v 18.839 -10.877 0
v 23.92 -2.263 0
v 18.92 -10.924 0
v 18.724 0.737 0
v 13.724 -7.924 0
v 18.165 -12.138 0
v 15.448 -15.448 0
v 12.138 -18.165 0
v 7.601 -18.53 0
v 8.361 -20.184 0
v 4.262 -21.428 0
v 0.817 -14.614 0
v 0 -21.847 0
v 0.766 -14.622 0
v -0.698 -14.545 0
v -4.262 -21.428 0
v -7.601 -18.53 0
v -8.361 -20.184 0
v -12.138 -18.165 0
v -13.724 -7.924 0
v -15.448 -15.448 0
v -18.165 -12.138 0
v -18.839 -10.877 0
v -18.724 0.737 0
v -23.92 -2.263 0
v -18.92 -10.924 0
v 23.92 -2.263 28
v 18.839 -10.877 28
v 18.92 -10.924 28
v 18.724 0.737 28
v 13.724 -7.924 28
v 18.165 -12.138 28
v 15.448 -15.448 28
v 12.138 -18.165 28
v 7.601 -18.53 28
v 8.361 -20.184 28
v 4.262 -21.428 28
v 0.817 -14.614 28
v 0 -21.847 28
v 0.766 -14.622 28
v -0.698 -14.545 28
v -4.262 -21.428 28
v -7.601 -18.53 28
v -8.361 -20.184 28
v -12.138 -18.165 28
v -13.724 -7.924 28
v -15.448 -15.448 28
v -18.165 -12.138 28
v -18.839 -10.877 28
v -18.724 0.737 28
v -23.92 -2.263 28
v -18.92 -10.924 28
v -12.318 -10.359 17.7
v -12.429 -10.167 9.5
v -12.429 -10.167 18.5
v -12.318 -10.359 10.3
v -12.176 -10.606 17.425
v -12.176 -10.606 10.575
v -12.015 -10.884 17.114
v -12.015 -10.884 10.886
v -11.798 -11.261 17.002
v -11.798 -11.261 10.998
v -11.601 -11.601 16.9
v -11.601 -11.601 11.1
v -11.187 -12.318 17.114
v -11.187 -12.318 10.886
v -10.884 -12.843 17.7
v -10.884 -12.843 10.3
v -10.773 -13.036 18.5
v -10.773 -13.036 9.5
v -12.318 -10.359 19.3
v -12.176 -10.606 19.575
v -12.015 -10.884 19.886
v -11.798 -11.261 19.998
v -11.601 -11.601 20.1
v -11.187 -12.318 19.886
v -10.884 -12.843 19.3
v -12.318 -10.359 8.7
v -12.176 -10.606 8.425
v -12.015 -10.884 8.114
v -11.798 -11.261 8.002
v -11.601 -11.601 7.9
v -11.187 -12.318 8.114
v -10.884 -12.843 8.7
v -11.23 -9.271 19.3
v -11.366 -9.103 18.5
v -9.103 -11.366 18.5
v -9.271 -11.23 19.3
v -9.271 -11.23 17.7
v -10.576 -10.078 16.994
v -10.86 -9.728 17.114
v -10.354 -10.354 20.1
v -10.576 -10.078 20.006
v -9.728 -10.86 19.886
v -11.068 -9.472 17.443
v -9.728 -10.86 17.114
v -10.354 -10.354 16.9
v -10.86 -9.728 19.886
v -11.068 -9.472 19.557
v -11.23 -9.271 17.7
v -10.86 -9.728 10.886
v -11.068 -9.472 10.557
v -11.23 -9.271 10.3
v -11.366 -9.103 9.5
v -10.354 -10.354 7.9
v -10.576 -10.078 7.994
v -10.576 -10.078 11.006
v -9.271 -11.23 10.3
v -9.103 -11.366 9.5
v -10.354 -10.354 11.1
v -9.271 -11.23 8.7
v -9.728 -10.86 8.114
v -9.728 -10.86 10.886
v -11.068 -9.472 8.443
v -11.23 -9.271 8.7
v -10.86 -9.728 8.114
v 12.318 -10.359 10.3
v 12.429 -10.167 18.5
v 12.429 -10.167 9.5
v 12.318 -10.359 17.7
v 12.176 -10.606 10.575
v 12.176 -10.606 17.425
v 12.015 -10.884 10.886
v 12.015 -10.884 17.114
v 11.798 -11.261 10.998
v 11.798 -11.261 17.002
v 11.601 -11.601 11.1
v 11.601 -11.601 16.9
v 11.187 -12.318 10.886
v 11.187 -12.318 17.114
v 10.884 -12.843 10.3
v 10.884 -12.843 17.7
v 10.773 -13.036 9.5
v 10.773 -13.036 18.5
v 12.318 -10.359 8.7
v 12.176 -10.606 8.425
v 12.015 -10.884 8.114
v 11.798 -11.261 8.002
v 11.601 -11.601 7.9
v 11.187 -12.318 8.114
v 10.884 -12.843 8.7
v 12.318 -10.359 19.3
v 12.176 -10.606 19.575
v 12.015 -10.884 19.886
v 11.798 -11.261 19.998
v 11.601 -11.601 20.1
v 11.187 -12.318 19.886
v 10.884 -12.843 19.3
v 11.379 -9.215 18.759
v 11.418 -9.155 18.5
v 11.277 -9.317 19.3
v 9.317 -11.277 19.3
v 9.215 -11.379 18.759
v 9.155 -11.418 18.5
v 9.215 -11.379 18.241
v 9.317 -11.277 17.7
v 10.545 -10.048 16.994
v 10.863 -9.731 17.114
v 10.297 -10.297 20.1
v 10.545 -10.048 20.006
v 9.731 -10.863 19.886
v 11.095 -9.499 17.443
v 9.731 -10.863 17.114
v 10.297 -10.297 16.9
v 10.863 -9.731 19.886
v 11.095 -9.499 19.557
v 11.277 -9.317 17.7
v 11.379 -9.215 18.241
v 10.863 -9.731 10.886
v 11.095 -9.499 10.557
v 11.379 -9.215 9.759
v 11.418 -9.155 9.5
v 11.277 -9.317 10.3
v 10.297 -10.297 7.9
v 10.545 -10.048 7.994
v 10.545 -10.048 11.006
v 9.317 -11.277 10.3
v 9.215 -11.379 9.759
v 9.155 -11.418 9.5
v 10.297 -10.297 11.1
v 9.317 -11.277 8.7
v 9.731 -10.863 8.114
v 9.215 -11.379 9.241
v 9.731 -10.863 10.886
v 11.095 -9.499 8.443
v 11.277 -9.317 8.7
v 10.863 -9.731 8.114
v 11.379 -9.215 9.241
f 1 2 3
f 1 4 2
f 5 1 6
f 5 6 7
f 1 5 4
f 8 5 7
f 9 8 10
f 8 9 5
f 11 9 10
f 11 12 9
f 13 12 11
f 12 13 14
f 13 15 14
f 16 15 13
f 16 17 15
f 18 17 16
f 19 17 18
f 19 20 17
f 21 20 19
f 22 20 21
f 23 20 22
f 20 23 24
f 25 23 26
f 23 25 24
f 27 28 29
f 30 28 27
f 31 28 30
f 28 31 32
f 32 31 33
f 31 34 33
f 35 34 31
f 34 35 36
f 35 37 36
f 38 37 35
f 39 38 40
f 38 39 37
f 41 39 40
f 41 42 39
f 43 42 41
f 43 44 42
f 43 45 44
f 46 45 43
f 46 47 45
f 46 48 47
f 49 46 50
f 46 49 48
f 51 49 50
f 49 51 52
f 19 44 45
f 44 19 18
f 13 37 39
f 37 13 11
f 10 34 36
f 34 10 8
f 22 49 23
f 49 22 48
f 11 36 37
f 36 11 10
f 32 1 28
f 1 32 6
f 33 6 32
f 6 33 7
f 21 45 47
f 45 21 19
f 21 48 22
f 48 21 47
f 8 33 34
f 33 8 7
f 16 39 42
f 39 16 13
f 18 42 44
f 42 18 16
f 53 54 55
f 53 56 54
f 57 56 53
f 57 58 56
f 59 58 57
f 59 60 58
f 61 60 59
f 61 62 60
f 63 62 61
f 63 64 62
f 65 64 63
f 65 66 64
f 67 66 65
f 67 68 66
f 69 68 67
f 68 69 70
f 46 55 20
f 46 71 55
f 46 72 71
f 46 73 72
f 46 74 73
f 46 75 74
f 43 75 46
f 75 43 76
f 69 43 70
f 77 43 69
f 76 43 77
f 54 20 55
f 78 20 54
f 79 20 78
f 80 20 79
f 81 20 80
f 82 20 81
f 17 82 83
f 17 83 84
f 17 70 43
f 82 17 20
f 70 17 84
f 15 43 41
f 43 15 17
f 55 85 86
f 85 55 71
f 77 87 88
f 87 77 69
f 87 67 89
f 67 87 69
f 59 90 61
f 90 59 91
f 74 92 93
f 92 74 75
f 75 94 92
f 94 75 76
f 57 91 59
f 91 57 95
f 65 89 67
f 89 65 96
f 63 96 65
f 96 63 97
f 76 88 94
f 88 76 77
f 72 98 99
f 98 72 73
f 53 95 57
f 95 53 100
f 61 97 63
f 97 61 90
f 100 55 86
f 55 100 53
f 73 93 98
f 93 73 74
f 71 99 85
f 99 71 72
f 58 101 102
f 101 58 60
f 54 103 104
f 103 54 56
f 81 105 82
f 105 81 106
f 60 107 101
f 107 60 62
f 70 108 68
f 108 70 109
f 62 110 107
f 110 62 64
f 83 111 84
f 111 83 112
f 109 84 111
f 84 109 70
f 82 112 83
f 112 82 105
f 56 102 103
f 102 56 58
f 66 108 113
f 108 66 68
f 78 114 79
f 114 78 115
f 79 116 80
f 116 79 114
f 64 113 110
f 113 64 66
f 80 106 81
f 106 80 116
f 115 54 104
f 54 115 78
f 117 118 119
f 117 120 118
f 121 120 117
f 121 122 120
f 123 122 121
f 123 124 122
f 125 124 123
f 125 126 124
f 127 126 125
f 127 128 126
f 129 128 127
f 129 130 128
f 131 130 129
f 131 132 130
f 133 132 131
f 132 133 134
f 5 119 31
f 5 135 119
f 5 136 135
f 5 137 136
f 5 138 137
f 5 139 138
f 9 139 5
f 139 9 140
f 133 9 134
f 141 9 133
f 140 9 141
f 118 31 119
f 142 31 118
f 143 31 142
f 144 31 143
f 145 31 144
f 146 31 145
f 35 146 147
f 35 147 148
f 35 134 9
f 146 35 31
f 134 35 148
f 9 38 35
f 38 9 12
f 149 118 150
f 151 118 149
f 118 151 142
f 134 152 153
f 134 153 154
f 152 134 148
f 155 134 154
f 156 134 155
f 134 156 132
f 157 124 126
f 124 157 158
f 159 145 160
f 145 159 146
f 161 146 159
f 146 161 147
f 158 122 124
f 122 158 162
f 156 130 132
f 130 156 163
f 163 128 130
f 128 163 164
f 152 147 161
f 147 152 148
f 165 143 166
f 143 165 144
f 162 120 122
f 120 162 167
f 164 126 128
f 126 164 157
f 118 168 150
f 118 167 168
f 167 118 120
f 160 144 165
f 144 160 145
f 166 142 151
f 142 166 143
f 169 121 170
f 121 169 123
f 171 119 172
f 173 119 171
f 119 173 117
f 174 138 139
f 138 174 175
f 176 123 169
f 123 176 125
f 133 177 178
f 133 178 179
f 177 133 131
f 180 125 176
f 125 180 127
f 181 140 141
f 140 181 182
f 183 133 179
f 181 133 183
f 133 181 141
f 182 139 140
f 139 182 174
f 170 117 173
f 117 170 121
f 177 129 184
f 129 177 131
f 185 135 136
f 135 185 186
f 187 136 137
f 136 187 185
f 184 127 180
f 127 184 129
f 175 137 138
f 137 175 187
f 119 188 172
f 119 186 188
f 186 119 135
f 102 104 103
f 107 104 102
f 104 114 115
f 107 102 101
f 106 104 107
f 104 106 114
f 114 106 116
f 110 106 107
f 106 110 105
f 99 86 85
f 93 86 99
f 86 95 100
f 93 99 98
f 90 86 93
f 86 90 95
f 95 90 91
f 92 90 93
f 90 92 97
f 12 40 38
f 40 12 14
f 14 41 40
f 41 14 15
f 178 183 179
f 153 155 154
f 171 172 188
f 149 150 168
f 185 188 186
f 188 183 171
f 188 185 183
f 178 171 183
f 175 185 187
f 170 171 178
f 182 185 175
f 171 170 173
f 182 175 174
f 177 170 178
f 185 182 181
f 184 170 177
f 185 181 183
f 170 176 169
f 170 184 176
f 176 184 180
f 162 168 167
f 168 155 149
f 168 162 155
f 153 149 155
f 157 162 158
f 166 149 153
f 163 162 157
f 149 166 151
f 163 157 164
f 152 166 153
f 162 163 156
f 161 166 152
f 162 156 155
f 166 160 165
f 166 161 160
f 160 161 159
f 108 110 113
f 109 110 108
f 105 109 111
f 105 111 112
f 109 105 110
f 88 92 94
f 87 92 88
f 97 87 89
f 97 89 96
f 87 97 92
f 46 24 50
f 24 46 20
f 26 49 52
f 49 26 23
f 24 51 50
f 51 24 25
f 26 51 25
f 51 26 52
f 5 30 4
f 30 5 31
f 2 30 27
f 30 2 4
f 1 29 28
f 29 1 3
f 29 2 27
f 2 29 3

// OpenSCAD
// file: libraries/frame_axis_block.scad
// extr=20; h = 3*extr; w = h; diagonal = extr*sqrt(2); thickness=3.6; 
 

module frame_axis_block(h, w, thickness, extr, diagonal) {
  difference() {
    intersection() {
      //rotate([0, 0, -30])
       translate([-extr*sin(15), -extr*cos(15), -h/2], center=false)
	        cube([extr*sin(15)+thickness, w, h]);
      union() {
	      translate([0,-extr*cos(15), -h/2]) 
      //   rotate([0, 0, -30])
	          cube([thickness, w, h]); //main frame plate
	    //  rotate([0, 0, -45])
        translate([-extr*sin(15), -extr*cos(15), -h/2])
          rotate([0,0,-15])
	          cube([extr, extr, h], center=false); //15degr extr cutout
      }
    } 
    
    
      // Vertical OpenBeam mounting screw holes.
       # for (z=[h/2-extr/2, -h/2+extr/2]) {
          translate([0, 0, z]) 
            rotate([90, 0, 75])
              translate([-extr/2, 0, extr/2*sin(15)+5]) {
                 cylinder(r=1.6, h=50, $fn=12, center=true);
                // cylinder(r=2.8, h=3, $fn=12, center=true);
        }
      }
    // Horizontal OpenBeam mounting screw holes.
       for (z= [h/2-extr/2, -h/2+extr/2]){
       for (y = [extr/2, w-extr*cos(15)-extr/2]) {
           translate([0, y, z])
             rotate([0, 90, 0])
               cylinder(r=1.6, h=10, $fn=12, center=true);
       }
      }  
    
}
}
//
// scale([1, 1, 1]) rotate([0, 90, 90]) rotate([0, 0, 30]) 
//{ frame_axis_block(h, w, thickness, extr, diagonal);
//    translate([-extr*sin(15), -extr*cos(15), -h]) rotate([0, 0, 75]) % cube([extr, extr, 1000], center=false);
//   }
// file: configuration.scad
// OD = outside diameter, corner to corner.
m3_nut_od = 6.1;
m3_nut_radius = (m3_nut_od+0.2)/2;
m3_nut_h=3;

// Major diameter of metric 3mm thread.
m3_major = 2.85;
m3_radius = m3_major/2;
m3_open_radius = 3.2/2;
m3_cap=4;
m3_clr=0.2;

m_frame_major = 3.8;
m_frame_radius=m_frame_major/2;
m_frame_clr=0.3;
m_frame_open=m_frame_radius+m_frame_clr*2;
m_frame_cap=8/2;
m_frame_nut=8/2;

// NEMA17 stepper motors.
motor_d=48;
motor_shaft_diameter = 5;
motor_shaft_radius = (motor_shaft_diameter+0.3)/2;

//frame motor dimm
motor_screws = 31; // mm center-to-center
motor_width = 42.5; // mm total motor face width
motor_height = 15; // mm bracket height
motor_length = 12; // mm bracket length
motor_screws_height = (motor_width - motor_screws) / 2;
motor_shaft = 30; // mm from motor face to OpenBeam center
motor_thickness = 5; // mm bracket thickness
//height = 2*extr + motor_width;
//diagonal = extr*sqrt(2);
motor_offset = motor_shaft+2;

// Frame brackets.
thickness = 3.6;

// extrusion dimmensions
extr = 20; //15 - 20 for 20x20 extrusion
extr_tslot = 6.8; //3.2 6.8 for 20x20 extrusion
extr_nut = 11; //5.8 11 for 20x20 extrusion
extr_corn = (extr - extr_tslot)/2;
diagonal=extr*sqrt(2);

clear = 0.35;
// corner parametrs
frame_thickness=6;
bracket = 5;
frame_type=0; //type 0 solid or 1 for sepparate parts
radius = thickness+cos(30)*diagonal/2+frame_thickness;
slot_hole=3;

//roller parametrs
extr_clr=0.7; // extrusion clearence distance
cone_radius = 5;
cone_radius_dwn = 4;
shrink_wrap = 0.1; // mm thickness
h_base=7;
H_roller=diagonal/2+extr_clr+h_base;
W_roller=diagonal/2+extr_clr+m3_radius;
rod_offset=W_roller+5; //(25)
layer_h=0.4;


// motor offset change 24mm - pulley size +2mm offset
//if (motor_shaft < 24) {
  //motor_offset = 24 ;
  //}
  //else  {motor_offset = 24;
  //}

//dimmensions calculations for frame_motor (some trigonometry)

f1= (extr*sin(15)+thickness)/cos(30);
f2=(extr*sin(15)+thickness)*cos(60)/sin(60);
L=f1+diagonal+motor_offset;
f4=L*sin(30)/cos(30)-motor_d/2;
f3=f4/2;
w_fm = L/cos(30)-f3-f2;

//motor cut_off frame
h_mot_cut_off = L*sin(30) - (motor_screws - motor_d/2)*cos(30);
// main file
include <configuration.scad>;
use<libraries/frame_axis_block.scad>;

//extr=15;
frame_thickness=6;
bracket = 5;
frame_type=0; //type 0 solid or 1 for sepparate parts

module corner(h,frame_thickness,frame_type) {
radius = thickness+cos(30)*diagonal/2+frame_thickness;  
  union(){
  difference() {
      intersection () {
        translate([0, extr/4, (h-extr)/2]) rotate([90,0,0])
          cube([diagonal+extr*1.8,h,diagonal+extr*1.8], center=true);
        translate([0, 0, (h-extr)/2])
          cylinder(h=h, r=radius, center=true, $fn=32);
      }
    
  // Remove 2/3 of cylinder.
    for (i=[-1,1])
    rotate([0,0,30*i])
    translate([0, radius, 0])
      cube([2*radius, 2*radius, 2*h], center=true);
  // Center round.
    
    rotate([0, 0, 45])
      cylinder(r=diagonal/2+0.5, h=2*h, center=true);
  // Horizontal OpenBeam frame pieces.
  for(i=[-1,1]) {
    rotate([0, 0, -30*i]) 
      translate([(radius-frame_thickness/2)*i, 40, (h-extr)/2])
        cube([frame_thickness+0.1, 60, h+1], center=true);
    
  // Frame brackets under the corner.
 
  translate([diagonal/2*i, 0, (h-extr)/2])
   rotate([0, 0, -30*i]) 
    scale([i,1,1]) frame_axis_block(h+1,diagonal*2,thickness,extr,diagonal,diagonal,diagonal,0);
    }


    if (frame_type==1) {
      if (h<(extr*1.5)){
       for (a = [-45, 45]) {
         rotate([0, 0, a]) rotate([90, 0, 0]) {
           cylinder(r=m3_radius , h=4*extr, center=true, $fn=12);
         translate([0, 0, radius])
           cylinder(r=m3_nut_radius, h=extr/2, center=true, $fn=24);
         }
       }
      } 
      else {
        for (a = [-45, 45]) {
          for (b =[-1,1]) {
            rotate([0, 0, a])
              rotate([90, 0, 0])
                translate([0, (h-extr)/2+(h-extr)/2*b, 0])
                  {
                  cylinder(r=m3_radius, h=4*extr, center=true, $fn=12);
                  translate([0, 0, radius])
                    cylinder(r=m3_nut_radius, h=extr/2, center=true, $fn=24);
                  }
          }
        }
      }
    
    }
  }
//square addon to corner circle    
for  (i=[-1,1]) {
      scale([i,1,1])
      rotate([180, 0, -30]) 
        translate([(radius-frame_thickness), 0, -(h-extr/2)])
         scale([1,-1,1])
          cube([frame_thickness, extr/2, h], center=false);
      }
  }

}

translate([0, 0, extr/2]) {
  corner(extr*1.4,frame_thickness,frame_type);
% rotate([0, 0, 45]) cube([extr, extr, 10*extr], center=true);  
}
